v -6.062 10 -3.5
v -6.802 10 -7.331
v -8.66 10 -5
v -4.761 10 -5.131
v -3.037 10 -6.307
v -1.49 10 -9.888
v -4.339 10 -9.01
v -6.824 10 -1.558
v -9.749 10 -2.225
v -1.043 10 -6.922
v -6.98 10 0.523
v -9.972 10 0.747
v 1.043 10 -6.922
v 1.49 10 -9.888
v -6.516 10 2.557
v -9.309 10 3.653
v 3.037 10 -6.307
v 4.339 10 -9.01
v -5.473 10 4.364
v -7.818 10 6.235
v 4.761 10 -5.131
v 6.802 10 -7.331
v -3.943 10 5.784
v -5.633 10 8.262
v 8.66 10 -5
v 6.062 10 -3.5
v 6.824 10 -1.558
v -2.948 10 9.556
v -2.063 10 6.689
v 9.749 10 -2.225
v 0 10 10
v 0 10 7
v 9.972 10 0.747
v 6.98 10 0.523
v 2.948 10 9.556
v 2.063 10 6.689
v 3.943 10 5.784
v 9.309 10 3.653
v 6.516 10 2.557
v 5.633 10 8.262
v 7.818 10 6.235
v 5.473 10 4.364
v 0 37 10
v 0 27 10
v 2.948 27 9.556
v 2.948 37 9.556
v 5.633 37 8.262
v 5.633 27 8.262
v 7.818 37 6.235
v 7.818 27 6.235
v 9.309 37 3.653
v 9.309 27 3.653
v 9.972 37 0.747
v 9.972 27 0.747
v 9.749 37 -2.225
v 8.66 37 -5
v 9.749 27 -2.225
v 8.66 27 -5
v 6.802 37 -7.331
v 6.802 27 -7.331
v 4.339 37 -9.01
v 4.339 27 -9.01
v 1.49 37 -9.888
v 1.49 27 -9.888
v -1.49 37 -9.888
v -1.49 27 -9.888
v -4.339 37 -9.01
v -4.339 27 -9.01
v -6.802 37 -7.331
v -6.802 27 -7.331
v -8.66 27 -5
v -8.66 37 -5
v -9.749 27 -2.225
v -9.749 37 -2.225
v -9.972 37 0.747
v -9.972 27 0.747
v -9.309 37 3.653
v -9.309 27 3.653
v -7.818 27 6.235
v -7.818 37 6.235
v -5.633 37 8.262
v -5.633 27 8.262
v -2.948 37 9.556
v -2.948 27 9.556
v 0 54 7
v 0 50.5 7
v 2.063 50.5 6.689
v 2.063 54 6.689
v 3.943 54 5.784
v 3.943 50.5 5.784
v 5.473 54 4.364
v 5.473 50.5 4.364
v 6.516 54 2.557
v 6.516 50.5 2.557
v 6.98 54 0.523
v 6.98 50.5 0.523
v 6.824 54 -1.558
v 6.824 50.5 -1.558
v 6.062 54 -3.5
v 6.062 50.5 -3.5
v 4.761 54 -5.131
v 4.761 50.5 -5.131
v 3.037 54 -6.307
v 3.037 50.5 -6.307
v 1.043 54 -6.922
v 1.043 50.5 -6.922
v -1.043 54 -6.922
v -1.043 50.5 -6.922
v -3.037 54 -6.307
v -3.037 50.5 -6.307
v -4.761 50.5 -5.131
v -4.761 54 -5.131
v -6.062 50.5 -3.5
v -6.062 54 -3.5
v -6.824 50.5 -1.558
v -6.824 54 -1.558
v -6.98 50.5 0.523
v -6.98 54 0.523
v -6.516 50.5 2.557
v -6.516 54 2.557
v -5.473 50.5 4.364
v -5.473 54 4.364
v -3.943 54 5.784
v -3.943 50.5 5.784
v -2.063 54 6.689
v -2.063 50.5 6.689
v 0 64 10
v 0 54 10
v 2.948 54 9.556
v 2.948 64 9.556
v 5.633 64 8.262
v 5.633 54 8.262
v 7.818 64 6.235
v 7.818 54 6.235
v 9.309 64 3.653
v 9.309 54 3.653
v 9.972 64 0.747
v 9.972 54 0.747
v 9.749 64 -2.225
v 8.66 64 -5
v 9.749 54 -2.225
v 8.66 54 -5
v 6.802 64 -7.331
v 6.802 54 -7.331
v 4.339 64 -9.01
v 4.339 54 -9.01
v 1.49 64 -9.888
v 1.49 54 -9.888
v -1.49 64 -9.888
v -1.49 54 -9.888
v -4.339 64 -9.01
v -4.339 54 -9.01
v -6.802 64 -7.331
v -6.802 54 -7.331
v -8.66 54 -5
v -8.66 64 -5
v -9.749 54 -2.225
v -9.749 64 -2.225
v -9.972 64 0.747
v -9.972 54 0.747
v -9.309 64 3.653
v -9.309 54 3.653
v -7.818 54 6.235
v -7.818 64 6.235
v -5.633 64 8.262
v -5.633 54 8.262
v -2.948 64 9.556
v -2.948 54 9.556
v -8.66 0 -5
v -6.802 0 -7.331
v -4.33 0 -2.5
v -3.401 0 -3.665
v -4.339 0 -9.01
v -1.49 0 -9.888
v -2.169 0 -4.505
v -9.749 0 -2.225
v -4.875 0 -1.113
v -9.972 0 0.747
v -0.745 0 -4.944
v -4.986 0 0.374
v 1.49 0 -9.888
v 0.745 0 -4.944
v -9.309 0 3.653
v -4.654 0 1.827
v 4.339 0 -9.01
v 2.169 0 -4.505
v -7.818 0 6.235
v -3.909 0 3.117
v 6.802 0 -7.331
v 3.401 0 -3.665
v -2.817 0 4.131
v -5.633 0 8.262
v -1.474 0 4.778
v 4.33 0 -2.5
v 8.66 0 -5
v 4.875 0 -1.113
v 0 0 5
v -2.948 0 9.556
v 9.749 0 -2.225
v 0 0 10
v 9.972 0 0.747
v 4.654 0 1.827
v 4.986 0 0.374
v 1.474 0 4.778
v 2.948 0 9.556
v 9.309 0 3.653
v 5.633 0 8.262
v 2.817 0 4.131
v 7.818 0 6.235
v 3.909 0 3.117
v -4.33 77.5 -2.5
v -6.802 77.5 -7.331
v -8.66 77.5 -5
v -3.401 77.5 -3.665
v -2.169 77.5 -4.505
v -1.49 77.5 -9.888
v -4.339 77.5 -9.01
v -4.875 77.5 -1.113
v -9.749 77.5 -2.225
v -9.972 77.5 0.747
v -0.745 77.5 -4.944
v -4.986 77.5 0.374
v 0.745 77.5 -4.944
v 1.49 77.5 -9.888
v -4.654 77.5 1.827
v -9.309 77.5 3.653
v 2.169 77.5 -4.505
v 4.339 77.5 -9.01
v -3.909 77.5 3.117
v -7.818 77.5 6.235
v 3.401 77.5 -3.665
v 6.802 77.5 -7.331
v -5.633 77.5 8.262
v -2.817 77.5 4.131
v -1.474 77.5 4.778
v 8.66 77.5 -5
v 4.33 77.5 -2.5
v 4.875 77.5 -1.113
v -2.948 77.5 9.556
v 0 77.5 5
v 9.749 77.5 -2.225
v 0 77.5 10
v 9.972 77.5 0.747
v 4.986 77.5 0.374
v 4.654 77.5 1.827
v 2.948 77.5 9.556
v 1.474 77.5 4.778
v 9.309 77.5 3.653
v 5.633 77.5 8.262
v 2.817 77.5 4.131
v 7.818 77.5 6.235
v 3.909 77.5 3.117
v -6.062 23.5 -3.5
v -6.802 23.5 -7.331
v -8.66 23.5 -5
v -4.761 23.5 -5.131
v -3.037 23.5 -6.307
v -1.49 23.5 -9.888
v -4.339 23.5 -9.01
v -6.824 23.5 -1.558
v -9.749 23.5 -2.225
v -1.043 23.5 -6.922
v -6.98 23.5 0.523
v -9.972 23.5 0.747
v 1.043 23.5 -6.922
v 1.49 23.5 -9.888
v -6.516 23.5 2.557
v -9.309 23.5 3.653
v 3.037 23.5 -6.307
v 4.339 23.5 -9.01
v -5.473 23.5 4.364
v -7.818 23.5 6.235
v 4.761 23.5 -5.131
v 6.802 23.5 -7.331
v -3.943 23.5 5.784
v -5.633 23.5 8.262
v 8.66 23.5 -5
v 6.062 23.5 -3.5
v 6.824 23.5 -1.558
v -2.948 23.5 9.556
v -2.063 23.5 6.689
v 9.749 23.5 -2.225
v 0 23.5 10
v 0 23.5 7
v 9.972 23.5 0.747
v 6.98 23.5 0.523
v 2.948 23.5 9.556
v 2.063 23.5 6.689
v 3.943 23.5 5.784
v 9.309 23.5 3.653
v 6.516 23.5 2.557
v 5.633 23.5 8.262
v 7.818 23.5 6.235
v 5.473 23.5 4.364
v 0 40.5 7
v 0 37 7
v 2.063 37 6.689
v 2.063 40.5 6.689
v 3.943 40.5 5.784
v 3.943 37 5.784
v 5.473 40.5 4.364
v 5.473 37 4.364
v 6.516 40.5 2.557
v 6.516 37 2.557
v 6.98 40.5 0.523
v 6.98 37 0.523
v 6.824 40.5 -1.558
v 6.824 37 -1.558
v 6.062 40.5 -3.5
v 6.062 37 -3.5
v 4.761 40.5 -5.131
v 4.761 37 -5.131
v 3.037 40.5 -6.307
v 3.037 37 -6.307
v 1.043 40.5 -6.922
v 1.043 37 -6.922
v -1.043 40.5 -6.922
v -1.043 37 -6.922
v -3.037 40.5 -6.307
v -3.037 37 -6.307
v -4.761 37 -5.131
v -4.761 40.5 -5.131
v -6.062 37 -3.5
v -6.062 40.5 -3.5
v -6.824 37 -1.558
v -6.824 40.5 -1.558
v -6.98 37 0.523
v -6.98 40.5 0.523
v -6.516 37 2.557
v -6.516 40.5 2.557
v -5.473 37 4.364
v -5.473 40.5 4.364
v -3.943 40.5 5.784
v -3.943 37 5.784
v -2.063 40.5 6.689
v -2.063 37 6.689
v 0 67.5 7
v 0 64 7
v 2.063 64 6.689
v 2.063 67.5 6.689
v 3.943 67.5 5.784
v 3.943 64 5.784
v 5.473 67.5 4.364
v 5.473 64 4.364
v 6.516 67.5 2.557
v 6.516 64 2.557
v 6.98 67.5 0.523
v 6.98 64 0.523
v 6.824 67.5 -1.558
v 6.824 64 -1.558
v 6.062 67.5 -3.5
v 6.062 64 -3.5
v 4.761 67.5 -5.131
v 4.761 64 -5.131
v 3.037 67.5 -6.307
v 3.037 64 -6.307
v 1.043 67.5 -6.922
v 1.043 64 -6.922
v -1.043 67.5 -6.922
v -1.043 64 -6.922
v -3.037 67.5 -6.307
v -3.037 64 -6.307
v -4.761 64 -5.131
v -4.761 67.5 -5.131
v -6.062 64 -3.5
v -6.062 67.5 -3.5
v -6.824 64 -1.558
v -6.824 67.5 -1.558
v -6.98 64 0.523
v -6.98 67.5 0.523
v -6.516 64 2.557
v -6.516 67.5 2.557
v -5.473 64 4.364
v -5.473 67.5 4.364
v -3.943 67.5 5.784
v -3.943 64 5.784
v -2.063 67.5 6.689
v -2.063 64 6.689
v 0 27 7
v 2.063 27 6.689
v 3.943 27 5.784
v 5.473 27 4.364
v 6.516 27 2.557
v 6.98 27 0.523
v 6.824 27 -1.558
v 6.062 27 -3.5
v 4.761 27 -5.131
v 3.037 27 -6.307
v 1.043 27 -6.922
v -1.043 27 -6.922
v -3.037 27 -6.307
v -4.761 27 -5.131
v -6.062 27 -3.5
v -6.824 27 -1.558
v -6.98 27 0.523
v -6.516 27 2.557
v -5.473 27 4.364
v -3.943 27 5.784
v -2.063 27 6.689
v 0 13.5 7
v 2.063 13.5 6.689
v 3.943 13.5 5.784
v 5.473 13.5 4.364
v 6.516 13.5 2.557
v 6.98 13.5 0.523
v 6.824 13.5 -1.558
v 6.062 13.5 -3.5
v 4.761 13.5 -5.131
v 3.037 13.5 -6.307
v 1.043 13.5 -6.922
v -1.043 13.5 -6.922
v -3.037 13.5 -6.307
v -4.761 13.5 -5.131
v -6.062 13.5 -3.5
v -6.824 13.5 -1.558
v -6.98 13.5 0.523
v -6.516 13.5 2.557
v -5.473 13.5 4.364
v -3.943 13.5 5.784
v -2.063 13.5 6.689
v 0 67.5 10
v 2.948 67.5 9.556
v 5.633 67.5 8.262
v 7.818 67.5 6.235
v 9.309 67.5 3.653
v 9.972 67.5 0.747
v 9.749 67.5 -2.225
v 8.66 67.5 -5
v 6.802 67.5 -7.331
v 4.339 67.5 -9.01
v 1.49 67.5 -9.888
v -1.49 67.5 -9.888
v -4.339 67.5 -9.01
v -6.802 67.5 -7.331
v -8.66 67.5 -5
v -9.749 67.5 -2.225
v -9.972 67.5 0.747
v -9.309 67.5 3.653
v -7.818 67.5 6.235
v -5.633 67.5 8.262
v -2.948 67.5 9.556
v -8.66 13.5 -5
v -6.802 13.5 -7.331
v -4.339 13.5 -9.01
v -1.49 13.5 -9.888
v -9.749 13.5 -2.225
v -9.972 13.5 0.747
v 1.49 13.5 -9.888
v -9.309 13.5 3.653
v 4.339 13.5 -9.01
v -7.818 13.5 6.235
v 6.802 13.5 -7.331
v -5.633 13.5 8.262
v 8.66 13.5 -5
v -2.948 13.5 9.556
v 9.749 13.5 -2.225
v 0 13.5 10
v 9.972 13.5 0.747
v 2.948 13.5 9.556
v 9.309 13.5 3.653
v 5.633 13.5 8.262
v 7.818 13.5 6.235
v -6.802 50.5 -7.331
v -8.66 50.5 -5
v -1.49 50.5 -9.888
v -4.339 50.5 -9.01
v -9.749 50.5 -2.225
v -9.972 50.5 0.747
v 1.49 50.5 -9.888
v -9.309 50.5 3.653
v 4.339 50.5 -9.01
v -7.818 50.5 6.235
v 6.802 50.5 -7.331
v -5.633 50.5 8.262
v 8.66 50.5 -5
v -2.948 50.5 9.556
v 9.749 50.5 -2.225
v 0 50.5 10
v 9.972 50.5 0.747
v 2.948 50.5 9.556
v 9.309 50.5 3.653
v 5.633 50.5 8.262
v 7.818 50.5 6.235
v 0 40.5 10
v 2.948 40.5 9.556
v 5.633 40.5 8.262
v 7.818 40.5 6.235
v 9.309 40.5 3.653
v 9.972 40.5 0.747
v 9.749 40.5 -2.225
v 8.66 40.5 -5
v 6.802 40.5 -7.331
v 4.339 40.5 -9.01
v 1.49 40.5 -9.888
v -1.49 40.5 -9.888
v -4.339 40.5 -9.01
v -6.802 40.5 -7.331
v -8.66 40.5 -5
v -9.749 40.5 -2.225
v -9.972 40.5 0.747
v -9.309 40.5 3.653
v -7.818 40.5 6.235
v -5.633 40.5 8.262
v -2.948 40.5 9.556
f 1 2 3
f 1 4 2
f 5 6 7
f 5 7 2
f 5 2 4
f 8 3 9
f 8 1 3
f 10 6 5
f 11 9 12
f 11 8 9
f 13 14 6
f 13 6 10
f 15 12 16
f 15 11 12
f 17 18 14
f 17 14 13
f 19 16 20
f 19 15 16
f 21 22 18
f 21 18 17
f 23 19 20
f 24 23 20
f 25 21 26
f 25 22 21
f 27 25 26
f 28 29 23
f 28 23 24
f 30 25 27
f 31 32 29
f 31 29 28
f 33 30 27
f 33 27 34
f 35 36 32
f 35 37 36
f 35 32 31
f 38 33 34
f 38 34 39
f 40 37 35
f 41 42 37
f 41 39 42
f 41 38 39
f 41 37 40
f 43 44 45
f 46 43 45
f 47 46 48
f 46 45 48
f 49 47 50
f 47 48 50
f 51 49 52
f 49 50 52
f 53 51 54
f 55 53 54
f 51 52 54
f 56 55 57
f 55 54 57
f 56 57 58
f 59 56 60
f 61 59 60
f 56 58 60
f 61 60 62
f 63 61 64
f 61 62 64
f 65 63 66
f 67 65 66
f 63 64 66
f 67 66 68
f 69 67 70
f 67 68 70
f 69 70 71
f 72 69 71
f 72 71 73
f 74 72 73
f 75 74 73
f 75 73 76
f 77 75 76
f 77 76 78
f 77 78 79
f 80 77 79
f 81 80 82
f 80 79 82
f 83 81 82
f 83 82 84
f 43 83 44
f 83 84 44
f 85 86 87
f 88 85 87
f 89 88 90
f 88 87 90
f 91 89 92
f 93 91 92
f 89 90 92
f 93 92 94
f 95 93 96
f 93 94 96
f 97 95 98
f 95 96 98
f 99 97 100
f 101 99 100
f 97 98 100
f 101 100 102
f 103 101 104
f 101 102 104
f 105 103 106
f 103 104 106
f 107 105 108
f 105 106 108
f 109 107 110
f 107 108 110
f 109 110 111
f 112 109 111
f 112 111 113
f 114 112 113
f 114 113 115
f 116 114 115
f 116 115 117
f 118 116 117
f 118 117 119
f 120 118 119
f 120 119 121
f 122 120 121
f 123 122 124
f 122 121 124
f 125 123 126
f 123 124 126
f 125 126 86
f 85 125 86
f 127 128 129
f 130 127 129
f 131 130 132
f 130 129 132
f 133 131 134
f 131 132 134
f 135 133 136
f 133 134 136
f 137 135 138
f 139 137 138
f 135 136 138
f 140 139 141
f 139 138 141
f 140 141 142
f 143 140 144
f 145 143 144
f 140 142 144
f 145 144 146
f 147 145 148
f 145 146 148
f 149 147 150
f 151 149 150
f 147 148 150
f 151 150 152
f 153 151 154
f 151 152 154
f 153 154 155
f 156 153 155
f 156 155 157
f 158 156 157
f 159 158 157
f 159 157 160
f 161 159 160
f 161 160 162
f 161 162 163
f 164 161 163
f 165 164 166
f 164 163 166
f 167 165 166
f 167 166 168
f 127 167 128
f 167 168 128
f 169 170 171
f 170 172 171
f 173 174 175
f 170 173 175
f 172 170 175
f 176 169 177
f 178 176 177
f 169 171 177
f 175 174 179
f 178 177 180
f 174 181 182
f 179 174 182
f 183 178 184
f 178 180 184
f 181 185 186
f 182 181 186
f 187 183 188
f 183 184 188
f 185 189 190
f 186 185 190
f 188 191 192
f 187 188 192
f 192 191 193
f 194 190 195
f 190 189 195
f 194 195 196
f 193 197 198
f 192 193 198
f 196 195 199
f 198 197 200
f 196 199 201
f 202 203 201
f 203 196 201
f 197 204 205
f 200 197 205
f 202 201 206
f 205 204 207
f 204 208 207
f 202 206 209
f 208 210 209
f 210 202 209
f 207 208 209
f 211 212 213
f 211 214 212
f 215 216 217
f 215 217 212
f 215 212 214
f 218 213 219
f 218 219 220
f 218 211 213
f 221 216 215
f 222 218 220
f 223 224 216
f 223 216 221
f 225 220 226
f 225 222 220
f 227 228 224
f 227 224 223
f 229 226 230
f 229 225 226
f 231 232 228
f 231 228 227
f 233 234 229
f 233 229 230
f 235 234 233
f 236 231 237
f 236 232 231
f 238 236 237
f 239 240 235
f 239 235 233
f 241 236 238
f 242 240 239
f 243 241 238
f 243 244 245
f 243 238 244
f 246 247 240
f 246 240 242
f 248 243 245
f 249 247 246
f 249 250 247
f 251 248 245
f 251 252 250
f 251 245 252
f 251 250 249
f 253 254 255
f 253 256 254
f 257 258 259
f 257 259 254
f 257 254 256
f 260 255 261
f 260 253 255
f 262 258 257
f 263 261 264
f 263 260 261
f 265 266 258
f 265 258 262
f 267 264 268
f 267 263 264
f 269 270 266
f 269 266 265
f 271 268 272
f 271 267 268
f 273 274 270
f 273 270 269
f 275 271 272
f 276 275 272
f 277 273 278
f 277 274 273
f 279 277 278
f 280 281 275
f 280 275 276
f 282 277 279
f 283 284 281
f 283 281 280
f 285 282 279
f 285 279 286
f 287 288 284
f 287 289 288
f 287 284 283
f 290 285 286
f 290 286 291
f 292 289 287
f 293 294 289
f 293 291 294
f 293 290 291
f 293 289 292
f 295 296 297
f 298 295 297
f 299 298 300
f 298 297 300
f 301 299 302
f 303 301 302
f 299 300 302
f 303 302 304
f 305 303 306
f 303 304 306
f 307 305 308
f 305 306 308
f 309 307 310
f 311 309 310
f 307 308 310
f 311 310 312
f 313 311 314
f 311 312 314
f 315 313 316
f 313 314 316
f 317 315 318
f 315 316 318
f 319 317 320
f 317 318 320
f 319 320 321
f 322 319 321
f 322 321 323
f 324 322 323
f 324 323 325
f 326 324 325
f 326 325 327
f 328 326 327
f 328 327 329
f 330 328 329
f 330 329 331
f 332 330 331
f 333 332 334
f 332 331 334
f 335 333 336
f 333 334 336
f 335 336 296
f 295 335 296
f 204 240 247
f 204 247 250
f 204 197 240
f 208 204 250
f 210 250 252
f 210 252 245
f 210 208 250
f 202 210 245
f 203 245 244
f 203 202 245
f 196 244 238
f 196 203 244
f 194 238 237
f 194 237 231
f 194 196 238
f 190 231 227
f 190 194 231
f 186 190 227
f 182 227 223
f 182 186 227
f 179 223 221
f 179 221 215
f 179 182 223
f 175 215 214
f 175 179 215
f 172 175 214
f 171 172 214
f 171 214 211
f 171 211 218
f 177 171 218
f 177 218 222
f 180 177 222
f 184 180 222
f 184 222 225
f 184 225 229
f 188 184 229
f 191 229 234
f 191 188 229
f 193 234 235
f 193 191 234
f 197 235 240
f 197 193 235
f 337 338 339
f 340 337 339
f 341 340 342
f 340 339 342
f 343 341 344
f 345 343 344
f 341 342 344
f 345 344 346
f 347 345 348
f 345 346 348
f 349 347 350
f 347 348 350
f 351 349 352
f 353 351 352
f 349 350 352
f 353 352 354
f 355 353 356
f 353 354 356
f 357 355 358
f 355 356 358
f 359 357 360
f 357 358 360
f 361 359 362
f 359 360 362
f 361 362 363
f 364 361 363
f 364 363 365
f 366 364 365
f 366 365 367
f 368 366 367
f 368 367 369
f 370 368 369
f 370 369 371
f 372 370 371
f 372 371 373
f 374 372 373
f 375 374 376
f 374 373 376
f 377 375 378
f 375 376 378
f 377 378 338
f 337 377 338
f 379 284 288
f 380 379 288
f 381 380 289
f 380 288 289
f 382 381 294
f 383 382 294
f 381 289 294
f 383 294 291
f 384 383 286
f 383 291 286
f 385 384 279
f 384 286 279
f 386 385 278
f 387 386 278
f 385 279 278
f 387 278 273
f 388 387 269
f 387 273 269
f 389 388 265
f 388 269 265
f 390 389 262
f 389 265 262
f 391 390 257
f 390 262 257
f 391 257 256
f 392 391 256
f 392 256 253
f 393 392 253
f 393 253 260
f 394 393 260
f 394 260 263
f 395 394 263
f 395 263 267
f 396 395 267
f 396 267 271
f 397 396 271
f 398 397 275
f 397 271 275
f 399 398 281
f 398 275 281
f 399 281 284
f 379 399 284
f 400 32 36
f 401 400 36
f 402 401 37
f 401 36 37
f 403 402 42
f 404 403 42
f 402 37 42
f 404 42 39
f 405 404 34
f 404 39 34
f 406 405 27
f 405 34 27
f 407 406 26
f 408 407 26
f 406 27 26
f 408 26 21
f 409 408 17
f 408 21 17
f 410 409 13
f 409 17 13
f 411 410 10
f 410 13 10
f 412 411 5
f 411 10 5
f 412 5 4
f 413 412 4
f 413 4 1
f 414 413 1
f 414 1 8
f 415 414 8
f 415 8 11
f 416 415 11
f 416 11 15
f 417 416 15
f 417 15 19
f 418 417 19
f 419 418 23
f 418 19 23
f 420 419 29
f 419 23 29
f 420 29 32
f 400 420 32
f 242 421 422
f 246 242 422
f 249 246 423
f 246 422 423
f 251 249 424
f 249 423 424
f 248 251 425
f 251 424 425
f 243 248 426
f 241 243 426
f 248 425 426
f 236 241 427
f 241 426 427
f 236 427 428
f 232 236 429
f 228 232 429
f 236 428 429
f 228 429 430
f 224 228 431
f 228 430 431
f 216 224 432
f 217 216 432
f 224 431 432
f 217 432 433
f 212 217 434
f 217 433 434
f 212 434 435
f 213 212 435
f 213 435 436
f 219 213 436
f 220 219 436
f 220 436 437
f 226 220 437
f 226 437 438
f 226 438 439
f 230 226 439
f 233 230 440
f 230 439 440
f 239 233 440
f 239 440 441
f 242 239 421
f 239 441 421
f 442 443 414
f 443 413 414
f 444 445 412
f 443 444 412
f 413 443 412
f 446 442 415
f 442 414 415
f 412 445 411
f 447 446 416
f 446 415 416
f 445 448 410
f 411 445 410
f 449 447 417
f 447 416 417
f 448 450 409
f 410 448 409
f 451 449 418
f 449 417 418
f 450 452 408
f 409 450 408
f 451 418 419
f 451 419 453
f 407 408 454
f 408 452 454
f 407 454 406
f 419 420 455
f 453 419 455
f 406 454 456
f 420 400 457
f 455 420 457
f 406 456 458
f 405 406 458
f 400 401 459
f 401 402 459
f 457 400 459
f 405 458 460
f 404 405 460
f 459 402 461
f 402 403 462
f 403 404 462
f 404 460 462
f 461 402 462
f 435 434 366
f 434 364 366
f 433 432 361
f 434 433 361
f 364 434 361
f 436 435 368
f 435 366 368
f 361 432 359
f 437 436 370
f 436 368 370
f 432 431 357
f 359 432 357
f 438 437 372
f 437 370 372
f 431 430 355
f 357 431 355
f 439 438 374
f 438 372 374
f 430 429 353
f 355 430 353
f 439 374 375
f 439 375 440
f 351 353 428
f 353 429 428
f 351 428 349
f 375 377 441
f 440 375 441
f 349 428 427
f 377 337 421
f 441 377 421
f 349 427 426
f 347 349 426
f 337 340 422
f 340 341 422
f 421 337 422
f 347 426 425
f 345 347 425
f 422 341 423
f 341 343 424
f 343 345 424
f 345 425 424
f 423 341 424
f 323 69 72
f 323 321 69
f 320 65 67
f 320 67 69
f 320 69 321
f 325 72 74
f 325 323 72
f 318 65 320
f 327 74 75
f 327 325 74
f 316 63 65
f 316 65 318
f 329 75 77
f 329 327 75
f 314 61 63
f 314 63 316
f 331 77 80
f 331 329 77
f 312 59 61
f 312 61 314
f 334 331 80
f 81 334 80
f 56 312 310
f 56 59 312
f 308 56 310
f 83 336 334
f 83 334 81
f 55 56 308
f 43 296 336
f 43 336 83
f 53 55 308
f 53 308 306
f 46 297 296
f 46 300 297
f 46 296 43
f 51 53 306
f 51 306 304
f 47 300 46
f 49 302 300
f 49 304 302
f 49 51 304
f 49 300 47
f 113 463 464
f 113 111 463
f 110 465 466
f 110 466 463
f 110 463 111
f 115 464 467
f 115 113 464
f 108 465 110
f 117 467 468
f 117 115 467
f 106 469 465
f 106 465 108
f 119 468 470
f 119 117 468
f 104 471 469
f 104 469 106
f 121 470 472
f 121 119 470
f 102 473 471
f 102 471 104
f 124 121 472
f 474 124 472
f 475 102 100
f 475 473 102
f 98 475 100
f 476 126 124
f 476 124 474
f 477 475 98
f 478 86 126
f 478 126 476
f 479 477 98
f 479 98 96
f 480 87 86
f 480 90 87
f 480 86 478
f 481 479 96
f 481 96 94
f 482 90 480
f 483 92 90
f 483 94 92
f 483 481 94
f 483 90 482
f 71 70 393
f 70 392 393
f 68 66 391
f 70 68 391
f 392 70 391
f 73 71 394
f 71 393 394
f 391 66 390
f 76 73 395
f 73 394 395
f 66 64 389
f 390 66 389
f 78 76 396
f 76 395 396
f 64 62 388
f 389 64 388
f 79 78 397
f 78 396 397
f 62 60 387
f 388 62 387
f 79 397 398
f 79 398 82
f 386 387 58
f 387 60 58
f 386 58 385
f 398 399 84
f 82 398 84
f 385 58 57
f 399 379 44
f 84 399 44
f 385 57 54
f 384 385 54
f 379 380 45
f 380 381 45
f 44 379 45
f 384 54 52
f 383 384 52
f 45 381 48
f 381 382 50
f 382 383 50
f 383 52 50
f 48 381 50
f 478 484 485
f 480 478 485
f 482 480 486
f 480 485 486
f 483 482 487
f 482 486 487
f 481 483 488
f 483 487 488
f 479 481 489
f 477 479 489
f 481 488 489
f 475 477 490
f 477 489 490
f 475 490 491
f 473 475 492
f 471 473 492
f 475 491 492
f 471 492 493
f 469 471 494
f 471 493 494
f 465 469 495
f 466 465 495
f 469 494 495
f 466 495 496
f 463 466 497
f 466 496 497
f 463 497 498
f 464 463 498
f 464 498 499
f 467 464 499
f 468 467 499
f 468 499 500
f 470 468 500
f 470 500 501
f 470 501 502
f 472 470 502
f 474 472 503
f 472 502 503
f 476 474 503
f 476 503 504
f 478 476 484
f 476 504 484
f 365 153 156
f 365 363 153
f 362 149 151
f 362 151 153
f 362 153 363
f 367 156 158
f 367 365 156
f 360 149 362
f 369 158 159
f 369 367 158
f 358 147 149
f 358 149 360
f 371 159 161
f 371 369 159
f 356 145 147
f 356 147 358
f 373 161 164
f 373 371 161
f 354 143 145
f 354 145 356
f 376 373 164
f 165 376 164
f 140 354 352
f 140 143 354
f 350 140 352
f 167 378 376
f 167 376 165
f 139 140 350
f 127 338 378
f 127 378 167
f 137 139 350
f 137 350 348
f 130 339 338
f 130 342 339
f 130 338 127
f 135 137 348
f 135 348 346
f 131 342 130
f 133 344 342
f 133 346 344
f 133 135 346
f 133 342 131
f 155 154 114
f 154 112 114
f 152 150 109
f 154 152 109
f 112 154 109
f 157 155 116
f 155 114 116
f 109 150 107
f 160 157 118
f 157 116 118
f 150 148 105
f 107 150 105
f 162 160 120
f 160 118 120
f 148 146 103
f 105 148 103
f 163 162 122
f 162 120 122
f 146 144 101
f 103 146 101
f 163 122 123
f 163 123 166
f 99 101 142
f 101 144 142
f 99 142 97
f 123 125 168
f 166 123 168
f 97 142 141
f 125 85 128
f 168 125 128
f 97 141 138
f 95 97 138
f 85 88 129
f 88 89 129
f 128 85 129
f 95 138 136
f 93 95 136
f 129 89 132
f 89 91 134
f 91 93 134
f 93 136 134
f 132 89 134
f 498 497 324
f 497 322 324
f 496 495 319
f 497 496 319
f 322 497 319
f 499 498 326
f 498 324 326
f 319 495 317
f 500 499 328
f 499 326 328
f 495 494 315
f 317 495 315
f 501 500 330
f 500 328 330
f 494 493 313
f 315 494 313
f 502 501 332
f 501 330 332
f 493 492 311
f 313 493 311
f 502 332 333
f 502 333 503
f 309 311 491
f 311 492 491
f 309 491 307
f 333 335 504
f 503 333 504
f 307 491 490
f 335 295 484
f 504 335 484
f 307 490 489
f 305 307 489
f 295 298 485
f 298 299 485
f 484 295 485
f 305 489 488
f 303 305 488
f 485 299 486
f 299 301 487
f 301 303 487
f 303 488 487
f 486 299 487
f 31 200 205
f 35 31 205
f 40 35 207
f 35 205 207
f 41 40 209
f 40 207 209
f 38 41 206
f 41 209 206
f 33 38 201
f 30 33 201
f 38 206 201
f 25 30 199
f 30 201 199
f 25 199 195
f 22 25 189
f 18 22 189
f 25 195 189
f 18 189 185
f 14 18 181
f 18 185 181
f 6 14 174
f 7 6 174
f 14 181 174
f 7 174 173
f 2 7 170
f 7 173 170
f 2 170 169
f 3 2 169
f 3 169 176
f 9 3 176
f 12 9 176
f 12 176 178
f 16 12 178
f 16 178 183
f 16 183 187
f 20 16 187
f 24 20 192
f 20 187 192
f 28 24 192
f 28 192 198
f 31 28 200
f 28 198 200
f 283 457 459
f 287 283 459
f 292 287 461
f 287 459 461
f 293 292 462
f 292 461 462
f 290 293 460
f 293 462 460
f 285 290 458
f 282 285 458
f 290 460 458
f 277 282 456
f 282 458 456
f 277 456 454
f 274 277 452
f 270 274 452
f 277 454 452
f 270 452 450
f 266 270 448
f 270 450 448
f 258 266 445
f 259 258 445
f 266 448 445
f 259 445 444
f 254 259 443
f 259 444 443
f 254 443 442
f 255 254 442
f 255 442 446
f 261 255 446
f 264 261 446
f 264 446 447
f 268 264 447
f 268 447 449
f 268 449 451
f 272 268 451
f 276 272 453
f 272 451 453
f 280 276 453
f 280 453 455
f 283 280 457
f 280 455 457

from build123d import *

# Parameters (mm, degrees)
SKETCH1_R            = 10
SKETCH1_R_2          = 5
BOSS_EXTRUDE1_DEPTH  = 10
SKETCH2_R            = 7
SKETCH2_R_2          = 5
BOSS_EXTRUDE2_DEPTH  = 3.5
SKETCH3_R            = 10
SKETCH3_R_2          = 5
BOSS_EXTRUDE3_DEPTH  = 10
SKETCH4_R            = 7
SKETCH4_R_2          = 5
BOSS_EXTRUDE4_DEPTH  = 3.5
SKETCH5_R            = 10
SKETCH5_R_2          = 5
BOSS_EXTRUDE5_DEPTH  = 10
SKETCH6_R            = 7
SKETCH6_R_2          = 5
BOSS_EXTRUDE6_DEPTH  = 3.5
SKETCH7_R            = 10
SKETCH7_R_2          = 5
BOSS_EXTRUDE7_DEPTH  = 10
SKETCH8_R            = 7
SKETCH8_R_2          = 5
BOSS_EXTRUDE8_DEPTH  = 3.5
SKETCH9_R            = 10
SKETCH9_R_2          = 5
BOSS_EXTRUDE9_DEPTH  = 10
SKETCH10_R           = 7
SKETCH10_R_2         = 5
BOSS_EXTRUDE10_DEPTH = 3.5
SKETCH11_R           = 10
SKETCH11_R_2         = 5
BOSS_EXTRUDE11_DEPTH = 10


with BuildPart() as part:
    # Sketch1 → Boss-Extrude1 (new body)
    with BuildSketch(Plane(origin=(0, 0, 0), x_dir=(1, 0, 0), z_dir=(0, 1, 0))):
        Circle(SKETCH1_R)
        Circle(SKETCH1_R_2, mode=Mode.SUBTRACT)
    extrude(amount=BOSS_EXTRUDE1_DEPTH)

    # Sketch2 → Boss-Extrude2 (add)
    with BuildSketch(Plane(origin=(0, 10, 0), x_dir=(1, 0, 0), z_dir=(0, 1, 0))):
        Circle(SKETCH2_R)
        Circle(SKETCH2_R_2, mode=Mode.SUBTRACT)
    extrude(amount=BOSS_EXTRUDE2_DEPTH)

    # Sketch3 → Boss-Extrude3 (add)
    with BuildSketch(Plane(origin=(0, 13.5, 0), x_dir=(1, 0, 0), z_dir=(0, 1, 0))):
        Circle(SKETCH3_R)
        Circle(SKETCH3_R_2, mode=Mode.SUBTRACT)
    extrude(amount=BOSS_EXTRUDE3_DEPTH)

    # Sketch4 → Boss-Extrude4 (add)
    with BuildSketch(Plane(origin=(0, 23.5, 0), x_dir=(1, 0, 0), z_dir=(0, 1, 0))):
        Circle(SKETCH4_R)
        Circle(SKETCH4_R_2, mode=Mode.SUBTRACT)
    extrude(amount=BOSS_EXTRUDE4_DEPTH)

    # Sketch5 → Boss-Extrude5 (add)
    with BuildSketch(Plane(origin=(0, 27, 0), x_dir=(1, 0, 0), z_dir=(0, 1, 0))):
        Circle(SKETCH5_R)
        Circle(SKETCH5_R_2, mode=Mode.SUBTRACT)
    extrude(amount=BOSS_EXTRUDE5_DEPTH)

    # Sketch6 → Boss-Extrude6 (add)
    with BuildSketch(Plane(origin=(0, 37, 0), x_dir=(1, 0, 0), z_dir=(0, 1, 0))):
        Circle(SKETCH6_R)
        Circle(SKETCH6_R_2, mode=Mode.SUBTRACT)
    extrude(amount=BOSS_EXTRUDE6_DEPTH)

    # Sketch7 → Boss-Extrude7 (add)
    with BuildSketch(Plane(origin=(0, 40.5, 0), x_dir=(1, 0, 0), z_dir=(0, 1, 0))):
        Circle(SKETCH7_R)
        Circle(SKETCH7_R_2, mode=Mode.SUBTRACT)
    extrude(amount=BOSS_EXTRUDE7_DEPTH)

    # Sketch8 → Boss-Extrude8 (add)
    with BuildSketch(Plane(origin=(0, 50.5, 0), x_dir=(1, 0, 0), z_dir=(0, 1, 0))):
        Circle(SKETCH8_R)
        Circle(SKETCH8_R_2, mode=Mode.SUBTRACT)
    extrude(amount=BOSS_EXTRUDE8_DEPTH)

    # Sketch9 → Boss-Extrude9 (add)
    with BuildSketch(Plane(origin=(0, 54, 0), x_dir=(1, 0, 0), z_dir=(0, 1, 0))):
        Circle(SKETCH9_R)
        Circle(SKETCH9_R_2, mode=Mode.SUBTRACT)
    extrude(amount=BOSS_EXTRUDE9_DEPTH)

    # Sketch10 → Boss-Extrude10 (add)
    with BuildSketch(Plane(origin=(0, 64, 0), x_dir=(1, 0, 0), z_dir=(0, 1, 0))):
        Circle(SKETCH10_R)
        Circle(SKETCH10_R_2, mode=Mode.SUBTRACT)
    extrude(amount=BOSS_EXTRUDE10_DEPTH)

    # Sketch11 → Boss-Extrude11 (add)
    with BuildSketch(Plane(origin=(0, 67.5, 0), x_dir=(1, 0, 0), z_dir=(0, 1, 0))):
        Circle(SKETCH11_R)
        Circle(SKETCH11_R_2, mode=Mode.SUBTRACT)
    extrude(amount=BOSS_EXTRUDE11_DEPTH)


solid = part.part
